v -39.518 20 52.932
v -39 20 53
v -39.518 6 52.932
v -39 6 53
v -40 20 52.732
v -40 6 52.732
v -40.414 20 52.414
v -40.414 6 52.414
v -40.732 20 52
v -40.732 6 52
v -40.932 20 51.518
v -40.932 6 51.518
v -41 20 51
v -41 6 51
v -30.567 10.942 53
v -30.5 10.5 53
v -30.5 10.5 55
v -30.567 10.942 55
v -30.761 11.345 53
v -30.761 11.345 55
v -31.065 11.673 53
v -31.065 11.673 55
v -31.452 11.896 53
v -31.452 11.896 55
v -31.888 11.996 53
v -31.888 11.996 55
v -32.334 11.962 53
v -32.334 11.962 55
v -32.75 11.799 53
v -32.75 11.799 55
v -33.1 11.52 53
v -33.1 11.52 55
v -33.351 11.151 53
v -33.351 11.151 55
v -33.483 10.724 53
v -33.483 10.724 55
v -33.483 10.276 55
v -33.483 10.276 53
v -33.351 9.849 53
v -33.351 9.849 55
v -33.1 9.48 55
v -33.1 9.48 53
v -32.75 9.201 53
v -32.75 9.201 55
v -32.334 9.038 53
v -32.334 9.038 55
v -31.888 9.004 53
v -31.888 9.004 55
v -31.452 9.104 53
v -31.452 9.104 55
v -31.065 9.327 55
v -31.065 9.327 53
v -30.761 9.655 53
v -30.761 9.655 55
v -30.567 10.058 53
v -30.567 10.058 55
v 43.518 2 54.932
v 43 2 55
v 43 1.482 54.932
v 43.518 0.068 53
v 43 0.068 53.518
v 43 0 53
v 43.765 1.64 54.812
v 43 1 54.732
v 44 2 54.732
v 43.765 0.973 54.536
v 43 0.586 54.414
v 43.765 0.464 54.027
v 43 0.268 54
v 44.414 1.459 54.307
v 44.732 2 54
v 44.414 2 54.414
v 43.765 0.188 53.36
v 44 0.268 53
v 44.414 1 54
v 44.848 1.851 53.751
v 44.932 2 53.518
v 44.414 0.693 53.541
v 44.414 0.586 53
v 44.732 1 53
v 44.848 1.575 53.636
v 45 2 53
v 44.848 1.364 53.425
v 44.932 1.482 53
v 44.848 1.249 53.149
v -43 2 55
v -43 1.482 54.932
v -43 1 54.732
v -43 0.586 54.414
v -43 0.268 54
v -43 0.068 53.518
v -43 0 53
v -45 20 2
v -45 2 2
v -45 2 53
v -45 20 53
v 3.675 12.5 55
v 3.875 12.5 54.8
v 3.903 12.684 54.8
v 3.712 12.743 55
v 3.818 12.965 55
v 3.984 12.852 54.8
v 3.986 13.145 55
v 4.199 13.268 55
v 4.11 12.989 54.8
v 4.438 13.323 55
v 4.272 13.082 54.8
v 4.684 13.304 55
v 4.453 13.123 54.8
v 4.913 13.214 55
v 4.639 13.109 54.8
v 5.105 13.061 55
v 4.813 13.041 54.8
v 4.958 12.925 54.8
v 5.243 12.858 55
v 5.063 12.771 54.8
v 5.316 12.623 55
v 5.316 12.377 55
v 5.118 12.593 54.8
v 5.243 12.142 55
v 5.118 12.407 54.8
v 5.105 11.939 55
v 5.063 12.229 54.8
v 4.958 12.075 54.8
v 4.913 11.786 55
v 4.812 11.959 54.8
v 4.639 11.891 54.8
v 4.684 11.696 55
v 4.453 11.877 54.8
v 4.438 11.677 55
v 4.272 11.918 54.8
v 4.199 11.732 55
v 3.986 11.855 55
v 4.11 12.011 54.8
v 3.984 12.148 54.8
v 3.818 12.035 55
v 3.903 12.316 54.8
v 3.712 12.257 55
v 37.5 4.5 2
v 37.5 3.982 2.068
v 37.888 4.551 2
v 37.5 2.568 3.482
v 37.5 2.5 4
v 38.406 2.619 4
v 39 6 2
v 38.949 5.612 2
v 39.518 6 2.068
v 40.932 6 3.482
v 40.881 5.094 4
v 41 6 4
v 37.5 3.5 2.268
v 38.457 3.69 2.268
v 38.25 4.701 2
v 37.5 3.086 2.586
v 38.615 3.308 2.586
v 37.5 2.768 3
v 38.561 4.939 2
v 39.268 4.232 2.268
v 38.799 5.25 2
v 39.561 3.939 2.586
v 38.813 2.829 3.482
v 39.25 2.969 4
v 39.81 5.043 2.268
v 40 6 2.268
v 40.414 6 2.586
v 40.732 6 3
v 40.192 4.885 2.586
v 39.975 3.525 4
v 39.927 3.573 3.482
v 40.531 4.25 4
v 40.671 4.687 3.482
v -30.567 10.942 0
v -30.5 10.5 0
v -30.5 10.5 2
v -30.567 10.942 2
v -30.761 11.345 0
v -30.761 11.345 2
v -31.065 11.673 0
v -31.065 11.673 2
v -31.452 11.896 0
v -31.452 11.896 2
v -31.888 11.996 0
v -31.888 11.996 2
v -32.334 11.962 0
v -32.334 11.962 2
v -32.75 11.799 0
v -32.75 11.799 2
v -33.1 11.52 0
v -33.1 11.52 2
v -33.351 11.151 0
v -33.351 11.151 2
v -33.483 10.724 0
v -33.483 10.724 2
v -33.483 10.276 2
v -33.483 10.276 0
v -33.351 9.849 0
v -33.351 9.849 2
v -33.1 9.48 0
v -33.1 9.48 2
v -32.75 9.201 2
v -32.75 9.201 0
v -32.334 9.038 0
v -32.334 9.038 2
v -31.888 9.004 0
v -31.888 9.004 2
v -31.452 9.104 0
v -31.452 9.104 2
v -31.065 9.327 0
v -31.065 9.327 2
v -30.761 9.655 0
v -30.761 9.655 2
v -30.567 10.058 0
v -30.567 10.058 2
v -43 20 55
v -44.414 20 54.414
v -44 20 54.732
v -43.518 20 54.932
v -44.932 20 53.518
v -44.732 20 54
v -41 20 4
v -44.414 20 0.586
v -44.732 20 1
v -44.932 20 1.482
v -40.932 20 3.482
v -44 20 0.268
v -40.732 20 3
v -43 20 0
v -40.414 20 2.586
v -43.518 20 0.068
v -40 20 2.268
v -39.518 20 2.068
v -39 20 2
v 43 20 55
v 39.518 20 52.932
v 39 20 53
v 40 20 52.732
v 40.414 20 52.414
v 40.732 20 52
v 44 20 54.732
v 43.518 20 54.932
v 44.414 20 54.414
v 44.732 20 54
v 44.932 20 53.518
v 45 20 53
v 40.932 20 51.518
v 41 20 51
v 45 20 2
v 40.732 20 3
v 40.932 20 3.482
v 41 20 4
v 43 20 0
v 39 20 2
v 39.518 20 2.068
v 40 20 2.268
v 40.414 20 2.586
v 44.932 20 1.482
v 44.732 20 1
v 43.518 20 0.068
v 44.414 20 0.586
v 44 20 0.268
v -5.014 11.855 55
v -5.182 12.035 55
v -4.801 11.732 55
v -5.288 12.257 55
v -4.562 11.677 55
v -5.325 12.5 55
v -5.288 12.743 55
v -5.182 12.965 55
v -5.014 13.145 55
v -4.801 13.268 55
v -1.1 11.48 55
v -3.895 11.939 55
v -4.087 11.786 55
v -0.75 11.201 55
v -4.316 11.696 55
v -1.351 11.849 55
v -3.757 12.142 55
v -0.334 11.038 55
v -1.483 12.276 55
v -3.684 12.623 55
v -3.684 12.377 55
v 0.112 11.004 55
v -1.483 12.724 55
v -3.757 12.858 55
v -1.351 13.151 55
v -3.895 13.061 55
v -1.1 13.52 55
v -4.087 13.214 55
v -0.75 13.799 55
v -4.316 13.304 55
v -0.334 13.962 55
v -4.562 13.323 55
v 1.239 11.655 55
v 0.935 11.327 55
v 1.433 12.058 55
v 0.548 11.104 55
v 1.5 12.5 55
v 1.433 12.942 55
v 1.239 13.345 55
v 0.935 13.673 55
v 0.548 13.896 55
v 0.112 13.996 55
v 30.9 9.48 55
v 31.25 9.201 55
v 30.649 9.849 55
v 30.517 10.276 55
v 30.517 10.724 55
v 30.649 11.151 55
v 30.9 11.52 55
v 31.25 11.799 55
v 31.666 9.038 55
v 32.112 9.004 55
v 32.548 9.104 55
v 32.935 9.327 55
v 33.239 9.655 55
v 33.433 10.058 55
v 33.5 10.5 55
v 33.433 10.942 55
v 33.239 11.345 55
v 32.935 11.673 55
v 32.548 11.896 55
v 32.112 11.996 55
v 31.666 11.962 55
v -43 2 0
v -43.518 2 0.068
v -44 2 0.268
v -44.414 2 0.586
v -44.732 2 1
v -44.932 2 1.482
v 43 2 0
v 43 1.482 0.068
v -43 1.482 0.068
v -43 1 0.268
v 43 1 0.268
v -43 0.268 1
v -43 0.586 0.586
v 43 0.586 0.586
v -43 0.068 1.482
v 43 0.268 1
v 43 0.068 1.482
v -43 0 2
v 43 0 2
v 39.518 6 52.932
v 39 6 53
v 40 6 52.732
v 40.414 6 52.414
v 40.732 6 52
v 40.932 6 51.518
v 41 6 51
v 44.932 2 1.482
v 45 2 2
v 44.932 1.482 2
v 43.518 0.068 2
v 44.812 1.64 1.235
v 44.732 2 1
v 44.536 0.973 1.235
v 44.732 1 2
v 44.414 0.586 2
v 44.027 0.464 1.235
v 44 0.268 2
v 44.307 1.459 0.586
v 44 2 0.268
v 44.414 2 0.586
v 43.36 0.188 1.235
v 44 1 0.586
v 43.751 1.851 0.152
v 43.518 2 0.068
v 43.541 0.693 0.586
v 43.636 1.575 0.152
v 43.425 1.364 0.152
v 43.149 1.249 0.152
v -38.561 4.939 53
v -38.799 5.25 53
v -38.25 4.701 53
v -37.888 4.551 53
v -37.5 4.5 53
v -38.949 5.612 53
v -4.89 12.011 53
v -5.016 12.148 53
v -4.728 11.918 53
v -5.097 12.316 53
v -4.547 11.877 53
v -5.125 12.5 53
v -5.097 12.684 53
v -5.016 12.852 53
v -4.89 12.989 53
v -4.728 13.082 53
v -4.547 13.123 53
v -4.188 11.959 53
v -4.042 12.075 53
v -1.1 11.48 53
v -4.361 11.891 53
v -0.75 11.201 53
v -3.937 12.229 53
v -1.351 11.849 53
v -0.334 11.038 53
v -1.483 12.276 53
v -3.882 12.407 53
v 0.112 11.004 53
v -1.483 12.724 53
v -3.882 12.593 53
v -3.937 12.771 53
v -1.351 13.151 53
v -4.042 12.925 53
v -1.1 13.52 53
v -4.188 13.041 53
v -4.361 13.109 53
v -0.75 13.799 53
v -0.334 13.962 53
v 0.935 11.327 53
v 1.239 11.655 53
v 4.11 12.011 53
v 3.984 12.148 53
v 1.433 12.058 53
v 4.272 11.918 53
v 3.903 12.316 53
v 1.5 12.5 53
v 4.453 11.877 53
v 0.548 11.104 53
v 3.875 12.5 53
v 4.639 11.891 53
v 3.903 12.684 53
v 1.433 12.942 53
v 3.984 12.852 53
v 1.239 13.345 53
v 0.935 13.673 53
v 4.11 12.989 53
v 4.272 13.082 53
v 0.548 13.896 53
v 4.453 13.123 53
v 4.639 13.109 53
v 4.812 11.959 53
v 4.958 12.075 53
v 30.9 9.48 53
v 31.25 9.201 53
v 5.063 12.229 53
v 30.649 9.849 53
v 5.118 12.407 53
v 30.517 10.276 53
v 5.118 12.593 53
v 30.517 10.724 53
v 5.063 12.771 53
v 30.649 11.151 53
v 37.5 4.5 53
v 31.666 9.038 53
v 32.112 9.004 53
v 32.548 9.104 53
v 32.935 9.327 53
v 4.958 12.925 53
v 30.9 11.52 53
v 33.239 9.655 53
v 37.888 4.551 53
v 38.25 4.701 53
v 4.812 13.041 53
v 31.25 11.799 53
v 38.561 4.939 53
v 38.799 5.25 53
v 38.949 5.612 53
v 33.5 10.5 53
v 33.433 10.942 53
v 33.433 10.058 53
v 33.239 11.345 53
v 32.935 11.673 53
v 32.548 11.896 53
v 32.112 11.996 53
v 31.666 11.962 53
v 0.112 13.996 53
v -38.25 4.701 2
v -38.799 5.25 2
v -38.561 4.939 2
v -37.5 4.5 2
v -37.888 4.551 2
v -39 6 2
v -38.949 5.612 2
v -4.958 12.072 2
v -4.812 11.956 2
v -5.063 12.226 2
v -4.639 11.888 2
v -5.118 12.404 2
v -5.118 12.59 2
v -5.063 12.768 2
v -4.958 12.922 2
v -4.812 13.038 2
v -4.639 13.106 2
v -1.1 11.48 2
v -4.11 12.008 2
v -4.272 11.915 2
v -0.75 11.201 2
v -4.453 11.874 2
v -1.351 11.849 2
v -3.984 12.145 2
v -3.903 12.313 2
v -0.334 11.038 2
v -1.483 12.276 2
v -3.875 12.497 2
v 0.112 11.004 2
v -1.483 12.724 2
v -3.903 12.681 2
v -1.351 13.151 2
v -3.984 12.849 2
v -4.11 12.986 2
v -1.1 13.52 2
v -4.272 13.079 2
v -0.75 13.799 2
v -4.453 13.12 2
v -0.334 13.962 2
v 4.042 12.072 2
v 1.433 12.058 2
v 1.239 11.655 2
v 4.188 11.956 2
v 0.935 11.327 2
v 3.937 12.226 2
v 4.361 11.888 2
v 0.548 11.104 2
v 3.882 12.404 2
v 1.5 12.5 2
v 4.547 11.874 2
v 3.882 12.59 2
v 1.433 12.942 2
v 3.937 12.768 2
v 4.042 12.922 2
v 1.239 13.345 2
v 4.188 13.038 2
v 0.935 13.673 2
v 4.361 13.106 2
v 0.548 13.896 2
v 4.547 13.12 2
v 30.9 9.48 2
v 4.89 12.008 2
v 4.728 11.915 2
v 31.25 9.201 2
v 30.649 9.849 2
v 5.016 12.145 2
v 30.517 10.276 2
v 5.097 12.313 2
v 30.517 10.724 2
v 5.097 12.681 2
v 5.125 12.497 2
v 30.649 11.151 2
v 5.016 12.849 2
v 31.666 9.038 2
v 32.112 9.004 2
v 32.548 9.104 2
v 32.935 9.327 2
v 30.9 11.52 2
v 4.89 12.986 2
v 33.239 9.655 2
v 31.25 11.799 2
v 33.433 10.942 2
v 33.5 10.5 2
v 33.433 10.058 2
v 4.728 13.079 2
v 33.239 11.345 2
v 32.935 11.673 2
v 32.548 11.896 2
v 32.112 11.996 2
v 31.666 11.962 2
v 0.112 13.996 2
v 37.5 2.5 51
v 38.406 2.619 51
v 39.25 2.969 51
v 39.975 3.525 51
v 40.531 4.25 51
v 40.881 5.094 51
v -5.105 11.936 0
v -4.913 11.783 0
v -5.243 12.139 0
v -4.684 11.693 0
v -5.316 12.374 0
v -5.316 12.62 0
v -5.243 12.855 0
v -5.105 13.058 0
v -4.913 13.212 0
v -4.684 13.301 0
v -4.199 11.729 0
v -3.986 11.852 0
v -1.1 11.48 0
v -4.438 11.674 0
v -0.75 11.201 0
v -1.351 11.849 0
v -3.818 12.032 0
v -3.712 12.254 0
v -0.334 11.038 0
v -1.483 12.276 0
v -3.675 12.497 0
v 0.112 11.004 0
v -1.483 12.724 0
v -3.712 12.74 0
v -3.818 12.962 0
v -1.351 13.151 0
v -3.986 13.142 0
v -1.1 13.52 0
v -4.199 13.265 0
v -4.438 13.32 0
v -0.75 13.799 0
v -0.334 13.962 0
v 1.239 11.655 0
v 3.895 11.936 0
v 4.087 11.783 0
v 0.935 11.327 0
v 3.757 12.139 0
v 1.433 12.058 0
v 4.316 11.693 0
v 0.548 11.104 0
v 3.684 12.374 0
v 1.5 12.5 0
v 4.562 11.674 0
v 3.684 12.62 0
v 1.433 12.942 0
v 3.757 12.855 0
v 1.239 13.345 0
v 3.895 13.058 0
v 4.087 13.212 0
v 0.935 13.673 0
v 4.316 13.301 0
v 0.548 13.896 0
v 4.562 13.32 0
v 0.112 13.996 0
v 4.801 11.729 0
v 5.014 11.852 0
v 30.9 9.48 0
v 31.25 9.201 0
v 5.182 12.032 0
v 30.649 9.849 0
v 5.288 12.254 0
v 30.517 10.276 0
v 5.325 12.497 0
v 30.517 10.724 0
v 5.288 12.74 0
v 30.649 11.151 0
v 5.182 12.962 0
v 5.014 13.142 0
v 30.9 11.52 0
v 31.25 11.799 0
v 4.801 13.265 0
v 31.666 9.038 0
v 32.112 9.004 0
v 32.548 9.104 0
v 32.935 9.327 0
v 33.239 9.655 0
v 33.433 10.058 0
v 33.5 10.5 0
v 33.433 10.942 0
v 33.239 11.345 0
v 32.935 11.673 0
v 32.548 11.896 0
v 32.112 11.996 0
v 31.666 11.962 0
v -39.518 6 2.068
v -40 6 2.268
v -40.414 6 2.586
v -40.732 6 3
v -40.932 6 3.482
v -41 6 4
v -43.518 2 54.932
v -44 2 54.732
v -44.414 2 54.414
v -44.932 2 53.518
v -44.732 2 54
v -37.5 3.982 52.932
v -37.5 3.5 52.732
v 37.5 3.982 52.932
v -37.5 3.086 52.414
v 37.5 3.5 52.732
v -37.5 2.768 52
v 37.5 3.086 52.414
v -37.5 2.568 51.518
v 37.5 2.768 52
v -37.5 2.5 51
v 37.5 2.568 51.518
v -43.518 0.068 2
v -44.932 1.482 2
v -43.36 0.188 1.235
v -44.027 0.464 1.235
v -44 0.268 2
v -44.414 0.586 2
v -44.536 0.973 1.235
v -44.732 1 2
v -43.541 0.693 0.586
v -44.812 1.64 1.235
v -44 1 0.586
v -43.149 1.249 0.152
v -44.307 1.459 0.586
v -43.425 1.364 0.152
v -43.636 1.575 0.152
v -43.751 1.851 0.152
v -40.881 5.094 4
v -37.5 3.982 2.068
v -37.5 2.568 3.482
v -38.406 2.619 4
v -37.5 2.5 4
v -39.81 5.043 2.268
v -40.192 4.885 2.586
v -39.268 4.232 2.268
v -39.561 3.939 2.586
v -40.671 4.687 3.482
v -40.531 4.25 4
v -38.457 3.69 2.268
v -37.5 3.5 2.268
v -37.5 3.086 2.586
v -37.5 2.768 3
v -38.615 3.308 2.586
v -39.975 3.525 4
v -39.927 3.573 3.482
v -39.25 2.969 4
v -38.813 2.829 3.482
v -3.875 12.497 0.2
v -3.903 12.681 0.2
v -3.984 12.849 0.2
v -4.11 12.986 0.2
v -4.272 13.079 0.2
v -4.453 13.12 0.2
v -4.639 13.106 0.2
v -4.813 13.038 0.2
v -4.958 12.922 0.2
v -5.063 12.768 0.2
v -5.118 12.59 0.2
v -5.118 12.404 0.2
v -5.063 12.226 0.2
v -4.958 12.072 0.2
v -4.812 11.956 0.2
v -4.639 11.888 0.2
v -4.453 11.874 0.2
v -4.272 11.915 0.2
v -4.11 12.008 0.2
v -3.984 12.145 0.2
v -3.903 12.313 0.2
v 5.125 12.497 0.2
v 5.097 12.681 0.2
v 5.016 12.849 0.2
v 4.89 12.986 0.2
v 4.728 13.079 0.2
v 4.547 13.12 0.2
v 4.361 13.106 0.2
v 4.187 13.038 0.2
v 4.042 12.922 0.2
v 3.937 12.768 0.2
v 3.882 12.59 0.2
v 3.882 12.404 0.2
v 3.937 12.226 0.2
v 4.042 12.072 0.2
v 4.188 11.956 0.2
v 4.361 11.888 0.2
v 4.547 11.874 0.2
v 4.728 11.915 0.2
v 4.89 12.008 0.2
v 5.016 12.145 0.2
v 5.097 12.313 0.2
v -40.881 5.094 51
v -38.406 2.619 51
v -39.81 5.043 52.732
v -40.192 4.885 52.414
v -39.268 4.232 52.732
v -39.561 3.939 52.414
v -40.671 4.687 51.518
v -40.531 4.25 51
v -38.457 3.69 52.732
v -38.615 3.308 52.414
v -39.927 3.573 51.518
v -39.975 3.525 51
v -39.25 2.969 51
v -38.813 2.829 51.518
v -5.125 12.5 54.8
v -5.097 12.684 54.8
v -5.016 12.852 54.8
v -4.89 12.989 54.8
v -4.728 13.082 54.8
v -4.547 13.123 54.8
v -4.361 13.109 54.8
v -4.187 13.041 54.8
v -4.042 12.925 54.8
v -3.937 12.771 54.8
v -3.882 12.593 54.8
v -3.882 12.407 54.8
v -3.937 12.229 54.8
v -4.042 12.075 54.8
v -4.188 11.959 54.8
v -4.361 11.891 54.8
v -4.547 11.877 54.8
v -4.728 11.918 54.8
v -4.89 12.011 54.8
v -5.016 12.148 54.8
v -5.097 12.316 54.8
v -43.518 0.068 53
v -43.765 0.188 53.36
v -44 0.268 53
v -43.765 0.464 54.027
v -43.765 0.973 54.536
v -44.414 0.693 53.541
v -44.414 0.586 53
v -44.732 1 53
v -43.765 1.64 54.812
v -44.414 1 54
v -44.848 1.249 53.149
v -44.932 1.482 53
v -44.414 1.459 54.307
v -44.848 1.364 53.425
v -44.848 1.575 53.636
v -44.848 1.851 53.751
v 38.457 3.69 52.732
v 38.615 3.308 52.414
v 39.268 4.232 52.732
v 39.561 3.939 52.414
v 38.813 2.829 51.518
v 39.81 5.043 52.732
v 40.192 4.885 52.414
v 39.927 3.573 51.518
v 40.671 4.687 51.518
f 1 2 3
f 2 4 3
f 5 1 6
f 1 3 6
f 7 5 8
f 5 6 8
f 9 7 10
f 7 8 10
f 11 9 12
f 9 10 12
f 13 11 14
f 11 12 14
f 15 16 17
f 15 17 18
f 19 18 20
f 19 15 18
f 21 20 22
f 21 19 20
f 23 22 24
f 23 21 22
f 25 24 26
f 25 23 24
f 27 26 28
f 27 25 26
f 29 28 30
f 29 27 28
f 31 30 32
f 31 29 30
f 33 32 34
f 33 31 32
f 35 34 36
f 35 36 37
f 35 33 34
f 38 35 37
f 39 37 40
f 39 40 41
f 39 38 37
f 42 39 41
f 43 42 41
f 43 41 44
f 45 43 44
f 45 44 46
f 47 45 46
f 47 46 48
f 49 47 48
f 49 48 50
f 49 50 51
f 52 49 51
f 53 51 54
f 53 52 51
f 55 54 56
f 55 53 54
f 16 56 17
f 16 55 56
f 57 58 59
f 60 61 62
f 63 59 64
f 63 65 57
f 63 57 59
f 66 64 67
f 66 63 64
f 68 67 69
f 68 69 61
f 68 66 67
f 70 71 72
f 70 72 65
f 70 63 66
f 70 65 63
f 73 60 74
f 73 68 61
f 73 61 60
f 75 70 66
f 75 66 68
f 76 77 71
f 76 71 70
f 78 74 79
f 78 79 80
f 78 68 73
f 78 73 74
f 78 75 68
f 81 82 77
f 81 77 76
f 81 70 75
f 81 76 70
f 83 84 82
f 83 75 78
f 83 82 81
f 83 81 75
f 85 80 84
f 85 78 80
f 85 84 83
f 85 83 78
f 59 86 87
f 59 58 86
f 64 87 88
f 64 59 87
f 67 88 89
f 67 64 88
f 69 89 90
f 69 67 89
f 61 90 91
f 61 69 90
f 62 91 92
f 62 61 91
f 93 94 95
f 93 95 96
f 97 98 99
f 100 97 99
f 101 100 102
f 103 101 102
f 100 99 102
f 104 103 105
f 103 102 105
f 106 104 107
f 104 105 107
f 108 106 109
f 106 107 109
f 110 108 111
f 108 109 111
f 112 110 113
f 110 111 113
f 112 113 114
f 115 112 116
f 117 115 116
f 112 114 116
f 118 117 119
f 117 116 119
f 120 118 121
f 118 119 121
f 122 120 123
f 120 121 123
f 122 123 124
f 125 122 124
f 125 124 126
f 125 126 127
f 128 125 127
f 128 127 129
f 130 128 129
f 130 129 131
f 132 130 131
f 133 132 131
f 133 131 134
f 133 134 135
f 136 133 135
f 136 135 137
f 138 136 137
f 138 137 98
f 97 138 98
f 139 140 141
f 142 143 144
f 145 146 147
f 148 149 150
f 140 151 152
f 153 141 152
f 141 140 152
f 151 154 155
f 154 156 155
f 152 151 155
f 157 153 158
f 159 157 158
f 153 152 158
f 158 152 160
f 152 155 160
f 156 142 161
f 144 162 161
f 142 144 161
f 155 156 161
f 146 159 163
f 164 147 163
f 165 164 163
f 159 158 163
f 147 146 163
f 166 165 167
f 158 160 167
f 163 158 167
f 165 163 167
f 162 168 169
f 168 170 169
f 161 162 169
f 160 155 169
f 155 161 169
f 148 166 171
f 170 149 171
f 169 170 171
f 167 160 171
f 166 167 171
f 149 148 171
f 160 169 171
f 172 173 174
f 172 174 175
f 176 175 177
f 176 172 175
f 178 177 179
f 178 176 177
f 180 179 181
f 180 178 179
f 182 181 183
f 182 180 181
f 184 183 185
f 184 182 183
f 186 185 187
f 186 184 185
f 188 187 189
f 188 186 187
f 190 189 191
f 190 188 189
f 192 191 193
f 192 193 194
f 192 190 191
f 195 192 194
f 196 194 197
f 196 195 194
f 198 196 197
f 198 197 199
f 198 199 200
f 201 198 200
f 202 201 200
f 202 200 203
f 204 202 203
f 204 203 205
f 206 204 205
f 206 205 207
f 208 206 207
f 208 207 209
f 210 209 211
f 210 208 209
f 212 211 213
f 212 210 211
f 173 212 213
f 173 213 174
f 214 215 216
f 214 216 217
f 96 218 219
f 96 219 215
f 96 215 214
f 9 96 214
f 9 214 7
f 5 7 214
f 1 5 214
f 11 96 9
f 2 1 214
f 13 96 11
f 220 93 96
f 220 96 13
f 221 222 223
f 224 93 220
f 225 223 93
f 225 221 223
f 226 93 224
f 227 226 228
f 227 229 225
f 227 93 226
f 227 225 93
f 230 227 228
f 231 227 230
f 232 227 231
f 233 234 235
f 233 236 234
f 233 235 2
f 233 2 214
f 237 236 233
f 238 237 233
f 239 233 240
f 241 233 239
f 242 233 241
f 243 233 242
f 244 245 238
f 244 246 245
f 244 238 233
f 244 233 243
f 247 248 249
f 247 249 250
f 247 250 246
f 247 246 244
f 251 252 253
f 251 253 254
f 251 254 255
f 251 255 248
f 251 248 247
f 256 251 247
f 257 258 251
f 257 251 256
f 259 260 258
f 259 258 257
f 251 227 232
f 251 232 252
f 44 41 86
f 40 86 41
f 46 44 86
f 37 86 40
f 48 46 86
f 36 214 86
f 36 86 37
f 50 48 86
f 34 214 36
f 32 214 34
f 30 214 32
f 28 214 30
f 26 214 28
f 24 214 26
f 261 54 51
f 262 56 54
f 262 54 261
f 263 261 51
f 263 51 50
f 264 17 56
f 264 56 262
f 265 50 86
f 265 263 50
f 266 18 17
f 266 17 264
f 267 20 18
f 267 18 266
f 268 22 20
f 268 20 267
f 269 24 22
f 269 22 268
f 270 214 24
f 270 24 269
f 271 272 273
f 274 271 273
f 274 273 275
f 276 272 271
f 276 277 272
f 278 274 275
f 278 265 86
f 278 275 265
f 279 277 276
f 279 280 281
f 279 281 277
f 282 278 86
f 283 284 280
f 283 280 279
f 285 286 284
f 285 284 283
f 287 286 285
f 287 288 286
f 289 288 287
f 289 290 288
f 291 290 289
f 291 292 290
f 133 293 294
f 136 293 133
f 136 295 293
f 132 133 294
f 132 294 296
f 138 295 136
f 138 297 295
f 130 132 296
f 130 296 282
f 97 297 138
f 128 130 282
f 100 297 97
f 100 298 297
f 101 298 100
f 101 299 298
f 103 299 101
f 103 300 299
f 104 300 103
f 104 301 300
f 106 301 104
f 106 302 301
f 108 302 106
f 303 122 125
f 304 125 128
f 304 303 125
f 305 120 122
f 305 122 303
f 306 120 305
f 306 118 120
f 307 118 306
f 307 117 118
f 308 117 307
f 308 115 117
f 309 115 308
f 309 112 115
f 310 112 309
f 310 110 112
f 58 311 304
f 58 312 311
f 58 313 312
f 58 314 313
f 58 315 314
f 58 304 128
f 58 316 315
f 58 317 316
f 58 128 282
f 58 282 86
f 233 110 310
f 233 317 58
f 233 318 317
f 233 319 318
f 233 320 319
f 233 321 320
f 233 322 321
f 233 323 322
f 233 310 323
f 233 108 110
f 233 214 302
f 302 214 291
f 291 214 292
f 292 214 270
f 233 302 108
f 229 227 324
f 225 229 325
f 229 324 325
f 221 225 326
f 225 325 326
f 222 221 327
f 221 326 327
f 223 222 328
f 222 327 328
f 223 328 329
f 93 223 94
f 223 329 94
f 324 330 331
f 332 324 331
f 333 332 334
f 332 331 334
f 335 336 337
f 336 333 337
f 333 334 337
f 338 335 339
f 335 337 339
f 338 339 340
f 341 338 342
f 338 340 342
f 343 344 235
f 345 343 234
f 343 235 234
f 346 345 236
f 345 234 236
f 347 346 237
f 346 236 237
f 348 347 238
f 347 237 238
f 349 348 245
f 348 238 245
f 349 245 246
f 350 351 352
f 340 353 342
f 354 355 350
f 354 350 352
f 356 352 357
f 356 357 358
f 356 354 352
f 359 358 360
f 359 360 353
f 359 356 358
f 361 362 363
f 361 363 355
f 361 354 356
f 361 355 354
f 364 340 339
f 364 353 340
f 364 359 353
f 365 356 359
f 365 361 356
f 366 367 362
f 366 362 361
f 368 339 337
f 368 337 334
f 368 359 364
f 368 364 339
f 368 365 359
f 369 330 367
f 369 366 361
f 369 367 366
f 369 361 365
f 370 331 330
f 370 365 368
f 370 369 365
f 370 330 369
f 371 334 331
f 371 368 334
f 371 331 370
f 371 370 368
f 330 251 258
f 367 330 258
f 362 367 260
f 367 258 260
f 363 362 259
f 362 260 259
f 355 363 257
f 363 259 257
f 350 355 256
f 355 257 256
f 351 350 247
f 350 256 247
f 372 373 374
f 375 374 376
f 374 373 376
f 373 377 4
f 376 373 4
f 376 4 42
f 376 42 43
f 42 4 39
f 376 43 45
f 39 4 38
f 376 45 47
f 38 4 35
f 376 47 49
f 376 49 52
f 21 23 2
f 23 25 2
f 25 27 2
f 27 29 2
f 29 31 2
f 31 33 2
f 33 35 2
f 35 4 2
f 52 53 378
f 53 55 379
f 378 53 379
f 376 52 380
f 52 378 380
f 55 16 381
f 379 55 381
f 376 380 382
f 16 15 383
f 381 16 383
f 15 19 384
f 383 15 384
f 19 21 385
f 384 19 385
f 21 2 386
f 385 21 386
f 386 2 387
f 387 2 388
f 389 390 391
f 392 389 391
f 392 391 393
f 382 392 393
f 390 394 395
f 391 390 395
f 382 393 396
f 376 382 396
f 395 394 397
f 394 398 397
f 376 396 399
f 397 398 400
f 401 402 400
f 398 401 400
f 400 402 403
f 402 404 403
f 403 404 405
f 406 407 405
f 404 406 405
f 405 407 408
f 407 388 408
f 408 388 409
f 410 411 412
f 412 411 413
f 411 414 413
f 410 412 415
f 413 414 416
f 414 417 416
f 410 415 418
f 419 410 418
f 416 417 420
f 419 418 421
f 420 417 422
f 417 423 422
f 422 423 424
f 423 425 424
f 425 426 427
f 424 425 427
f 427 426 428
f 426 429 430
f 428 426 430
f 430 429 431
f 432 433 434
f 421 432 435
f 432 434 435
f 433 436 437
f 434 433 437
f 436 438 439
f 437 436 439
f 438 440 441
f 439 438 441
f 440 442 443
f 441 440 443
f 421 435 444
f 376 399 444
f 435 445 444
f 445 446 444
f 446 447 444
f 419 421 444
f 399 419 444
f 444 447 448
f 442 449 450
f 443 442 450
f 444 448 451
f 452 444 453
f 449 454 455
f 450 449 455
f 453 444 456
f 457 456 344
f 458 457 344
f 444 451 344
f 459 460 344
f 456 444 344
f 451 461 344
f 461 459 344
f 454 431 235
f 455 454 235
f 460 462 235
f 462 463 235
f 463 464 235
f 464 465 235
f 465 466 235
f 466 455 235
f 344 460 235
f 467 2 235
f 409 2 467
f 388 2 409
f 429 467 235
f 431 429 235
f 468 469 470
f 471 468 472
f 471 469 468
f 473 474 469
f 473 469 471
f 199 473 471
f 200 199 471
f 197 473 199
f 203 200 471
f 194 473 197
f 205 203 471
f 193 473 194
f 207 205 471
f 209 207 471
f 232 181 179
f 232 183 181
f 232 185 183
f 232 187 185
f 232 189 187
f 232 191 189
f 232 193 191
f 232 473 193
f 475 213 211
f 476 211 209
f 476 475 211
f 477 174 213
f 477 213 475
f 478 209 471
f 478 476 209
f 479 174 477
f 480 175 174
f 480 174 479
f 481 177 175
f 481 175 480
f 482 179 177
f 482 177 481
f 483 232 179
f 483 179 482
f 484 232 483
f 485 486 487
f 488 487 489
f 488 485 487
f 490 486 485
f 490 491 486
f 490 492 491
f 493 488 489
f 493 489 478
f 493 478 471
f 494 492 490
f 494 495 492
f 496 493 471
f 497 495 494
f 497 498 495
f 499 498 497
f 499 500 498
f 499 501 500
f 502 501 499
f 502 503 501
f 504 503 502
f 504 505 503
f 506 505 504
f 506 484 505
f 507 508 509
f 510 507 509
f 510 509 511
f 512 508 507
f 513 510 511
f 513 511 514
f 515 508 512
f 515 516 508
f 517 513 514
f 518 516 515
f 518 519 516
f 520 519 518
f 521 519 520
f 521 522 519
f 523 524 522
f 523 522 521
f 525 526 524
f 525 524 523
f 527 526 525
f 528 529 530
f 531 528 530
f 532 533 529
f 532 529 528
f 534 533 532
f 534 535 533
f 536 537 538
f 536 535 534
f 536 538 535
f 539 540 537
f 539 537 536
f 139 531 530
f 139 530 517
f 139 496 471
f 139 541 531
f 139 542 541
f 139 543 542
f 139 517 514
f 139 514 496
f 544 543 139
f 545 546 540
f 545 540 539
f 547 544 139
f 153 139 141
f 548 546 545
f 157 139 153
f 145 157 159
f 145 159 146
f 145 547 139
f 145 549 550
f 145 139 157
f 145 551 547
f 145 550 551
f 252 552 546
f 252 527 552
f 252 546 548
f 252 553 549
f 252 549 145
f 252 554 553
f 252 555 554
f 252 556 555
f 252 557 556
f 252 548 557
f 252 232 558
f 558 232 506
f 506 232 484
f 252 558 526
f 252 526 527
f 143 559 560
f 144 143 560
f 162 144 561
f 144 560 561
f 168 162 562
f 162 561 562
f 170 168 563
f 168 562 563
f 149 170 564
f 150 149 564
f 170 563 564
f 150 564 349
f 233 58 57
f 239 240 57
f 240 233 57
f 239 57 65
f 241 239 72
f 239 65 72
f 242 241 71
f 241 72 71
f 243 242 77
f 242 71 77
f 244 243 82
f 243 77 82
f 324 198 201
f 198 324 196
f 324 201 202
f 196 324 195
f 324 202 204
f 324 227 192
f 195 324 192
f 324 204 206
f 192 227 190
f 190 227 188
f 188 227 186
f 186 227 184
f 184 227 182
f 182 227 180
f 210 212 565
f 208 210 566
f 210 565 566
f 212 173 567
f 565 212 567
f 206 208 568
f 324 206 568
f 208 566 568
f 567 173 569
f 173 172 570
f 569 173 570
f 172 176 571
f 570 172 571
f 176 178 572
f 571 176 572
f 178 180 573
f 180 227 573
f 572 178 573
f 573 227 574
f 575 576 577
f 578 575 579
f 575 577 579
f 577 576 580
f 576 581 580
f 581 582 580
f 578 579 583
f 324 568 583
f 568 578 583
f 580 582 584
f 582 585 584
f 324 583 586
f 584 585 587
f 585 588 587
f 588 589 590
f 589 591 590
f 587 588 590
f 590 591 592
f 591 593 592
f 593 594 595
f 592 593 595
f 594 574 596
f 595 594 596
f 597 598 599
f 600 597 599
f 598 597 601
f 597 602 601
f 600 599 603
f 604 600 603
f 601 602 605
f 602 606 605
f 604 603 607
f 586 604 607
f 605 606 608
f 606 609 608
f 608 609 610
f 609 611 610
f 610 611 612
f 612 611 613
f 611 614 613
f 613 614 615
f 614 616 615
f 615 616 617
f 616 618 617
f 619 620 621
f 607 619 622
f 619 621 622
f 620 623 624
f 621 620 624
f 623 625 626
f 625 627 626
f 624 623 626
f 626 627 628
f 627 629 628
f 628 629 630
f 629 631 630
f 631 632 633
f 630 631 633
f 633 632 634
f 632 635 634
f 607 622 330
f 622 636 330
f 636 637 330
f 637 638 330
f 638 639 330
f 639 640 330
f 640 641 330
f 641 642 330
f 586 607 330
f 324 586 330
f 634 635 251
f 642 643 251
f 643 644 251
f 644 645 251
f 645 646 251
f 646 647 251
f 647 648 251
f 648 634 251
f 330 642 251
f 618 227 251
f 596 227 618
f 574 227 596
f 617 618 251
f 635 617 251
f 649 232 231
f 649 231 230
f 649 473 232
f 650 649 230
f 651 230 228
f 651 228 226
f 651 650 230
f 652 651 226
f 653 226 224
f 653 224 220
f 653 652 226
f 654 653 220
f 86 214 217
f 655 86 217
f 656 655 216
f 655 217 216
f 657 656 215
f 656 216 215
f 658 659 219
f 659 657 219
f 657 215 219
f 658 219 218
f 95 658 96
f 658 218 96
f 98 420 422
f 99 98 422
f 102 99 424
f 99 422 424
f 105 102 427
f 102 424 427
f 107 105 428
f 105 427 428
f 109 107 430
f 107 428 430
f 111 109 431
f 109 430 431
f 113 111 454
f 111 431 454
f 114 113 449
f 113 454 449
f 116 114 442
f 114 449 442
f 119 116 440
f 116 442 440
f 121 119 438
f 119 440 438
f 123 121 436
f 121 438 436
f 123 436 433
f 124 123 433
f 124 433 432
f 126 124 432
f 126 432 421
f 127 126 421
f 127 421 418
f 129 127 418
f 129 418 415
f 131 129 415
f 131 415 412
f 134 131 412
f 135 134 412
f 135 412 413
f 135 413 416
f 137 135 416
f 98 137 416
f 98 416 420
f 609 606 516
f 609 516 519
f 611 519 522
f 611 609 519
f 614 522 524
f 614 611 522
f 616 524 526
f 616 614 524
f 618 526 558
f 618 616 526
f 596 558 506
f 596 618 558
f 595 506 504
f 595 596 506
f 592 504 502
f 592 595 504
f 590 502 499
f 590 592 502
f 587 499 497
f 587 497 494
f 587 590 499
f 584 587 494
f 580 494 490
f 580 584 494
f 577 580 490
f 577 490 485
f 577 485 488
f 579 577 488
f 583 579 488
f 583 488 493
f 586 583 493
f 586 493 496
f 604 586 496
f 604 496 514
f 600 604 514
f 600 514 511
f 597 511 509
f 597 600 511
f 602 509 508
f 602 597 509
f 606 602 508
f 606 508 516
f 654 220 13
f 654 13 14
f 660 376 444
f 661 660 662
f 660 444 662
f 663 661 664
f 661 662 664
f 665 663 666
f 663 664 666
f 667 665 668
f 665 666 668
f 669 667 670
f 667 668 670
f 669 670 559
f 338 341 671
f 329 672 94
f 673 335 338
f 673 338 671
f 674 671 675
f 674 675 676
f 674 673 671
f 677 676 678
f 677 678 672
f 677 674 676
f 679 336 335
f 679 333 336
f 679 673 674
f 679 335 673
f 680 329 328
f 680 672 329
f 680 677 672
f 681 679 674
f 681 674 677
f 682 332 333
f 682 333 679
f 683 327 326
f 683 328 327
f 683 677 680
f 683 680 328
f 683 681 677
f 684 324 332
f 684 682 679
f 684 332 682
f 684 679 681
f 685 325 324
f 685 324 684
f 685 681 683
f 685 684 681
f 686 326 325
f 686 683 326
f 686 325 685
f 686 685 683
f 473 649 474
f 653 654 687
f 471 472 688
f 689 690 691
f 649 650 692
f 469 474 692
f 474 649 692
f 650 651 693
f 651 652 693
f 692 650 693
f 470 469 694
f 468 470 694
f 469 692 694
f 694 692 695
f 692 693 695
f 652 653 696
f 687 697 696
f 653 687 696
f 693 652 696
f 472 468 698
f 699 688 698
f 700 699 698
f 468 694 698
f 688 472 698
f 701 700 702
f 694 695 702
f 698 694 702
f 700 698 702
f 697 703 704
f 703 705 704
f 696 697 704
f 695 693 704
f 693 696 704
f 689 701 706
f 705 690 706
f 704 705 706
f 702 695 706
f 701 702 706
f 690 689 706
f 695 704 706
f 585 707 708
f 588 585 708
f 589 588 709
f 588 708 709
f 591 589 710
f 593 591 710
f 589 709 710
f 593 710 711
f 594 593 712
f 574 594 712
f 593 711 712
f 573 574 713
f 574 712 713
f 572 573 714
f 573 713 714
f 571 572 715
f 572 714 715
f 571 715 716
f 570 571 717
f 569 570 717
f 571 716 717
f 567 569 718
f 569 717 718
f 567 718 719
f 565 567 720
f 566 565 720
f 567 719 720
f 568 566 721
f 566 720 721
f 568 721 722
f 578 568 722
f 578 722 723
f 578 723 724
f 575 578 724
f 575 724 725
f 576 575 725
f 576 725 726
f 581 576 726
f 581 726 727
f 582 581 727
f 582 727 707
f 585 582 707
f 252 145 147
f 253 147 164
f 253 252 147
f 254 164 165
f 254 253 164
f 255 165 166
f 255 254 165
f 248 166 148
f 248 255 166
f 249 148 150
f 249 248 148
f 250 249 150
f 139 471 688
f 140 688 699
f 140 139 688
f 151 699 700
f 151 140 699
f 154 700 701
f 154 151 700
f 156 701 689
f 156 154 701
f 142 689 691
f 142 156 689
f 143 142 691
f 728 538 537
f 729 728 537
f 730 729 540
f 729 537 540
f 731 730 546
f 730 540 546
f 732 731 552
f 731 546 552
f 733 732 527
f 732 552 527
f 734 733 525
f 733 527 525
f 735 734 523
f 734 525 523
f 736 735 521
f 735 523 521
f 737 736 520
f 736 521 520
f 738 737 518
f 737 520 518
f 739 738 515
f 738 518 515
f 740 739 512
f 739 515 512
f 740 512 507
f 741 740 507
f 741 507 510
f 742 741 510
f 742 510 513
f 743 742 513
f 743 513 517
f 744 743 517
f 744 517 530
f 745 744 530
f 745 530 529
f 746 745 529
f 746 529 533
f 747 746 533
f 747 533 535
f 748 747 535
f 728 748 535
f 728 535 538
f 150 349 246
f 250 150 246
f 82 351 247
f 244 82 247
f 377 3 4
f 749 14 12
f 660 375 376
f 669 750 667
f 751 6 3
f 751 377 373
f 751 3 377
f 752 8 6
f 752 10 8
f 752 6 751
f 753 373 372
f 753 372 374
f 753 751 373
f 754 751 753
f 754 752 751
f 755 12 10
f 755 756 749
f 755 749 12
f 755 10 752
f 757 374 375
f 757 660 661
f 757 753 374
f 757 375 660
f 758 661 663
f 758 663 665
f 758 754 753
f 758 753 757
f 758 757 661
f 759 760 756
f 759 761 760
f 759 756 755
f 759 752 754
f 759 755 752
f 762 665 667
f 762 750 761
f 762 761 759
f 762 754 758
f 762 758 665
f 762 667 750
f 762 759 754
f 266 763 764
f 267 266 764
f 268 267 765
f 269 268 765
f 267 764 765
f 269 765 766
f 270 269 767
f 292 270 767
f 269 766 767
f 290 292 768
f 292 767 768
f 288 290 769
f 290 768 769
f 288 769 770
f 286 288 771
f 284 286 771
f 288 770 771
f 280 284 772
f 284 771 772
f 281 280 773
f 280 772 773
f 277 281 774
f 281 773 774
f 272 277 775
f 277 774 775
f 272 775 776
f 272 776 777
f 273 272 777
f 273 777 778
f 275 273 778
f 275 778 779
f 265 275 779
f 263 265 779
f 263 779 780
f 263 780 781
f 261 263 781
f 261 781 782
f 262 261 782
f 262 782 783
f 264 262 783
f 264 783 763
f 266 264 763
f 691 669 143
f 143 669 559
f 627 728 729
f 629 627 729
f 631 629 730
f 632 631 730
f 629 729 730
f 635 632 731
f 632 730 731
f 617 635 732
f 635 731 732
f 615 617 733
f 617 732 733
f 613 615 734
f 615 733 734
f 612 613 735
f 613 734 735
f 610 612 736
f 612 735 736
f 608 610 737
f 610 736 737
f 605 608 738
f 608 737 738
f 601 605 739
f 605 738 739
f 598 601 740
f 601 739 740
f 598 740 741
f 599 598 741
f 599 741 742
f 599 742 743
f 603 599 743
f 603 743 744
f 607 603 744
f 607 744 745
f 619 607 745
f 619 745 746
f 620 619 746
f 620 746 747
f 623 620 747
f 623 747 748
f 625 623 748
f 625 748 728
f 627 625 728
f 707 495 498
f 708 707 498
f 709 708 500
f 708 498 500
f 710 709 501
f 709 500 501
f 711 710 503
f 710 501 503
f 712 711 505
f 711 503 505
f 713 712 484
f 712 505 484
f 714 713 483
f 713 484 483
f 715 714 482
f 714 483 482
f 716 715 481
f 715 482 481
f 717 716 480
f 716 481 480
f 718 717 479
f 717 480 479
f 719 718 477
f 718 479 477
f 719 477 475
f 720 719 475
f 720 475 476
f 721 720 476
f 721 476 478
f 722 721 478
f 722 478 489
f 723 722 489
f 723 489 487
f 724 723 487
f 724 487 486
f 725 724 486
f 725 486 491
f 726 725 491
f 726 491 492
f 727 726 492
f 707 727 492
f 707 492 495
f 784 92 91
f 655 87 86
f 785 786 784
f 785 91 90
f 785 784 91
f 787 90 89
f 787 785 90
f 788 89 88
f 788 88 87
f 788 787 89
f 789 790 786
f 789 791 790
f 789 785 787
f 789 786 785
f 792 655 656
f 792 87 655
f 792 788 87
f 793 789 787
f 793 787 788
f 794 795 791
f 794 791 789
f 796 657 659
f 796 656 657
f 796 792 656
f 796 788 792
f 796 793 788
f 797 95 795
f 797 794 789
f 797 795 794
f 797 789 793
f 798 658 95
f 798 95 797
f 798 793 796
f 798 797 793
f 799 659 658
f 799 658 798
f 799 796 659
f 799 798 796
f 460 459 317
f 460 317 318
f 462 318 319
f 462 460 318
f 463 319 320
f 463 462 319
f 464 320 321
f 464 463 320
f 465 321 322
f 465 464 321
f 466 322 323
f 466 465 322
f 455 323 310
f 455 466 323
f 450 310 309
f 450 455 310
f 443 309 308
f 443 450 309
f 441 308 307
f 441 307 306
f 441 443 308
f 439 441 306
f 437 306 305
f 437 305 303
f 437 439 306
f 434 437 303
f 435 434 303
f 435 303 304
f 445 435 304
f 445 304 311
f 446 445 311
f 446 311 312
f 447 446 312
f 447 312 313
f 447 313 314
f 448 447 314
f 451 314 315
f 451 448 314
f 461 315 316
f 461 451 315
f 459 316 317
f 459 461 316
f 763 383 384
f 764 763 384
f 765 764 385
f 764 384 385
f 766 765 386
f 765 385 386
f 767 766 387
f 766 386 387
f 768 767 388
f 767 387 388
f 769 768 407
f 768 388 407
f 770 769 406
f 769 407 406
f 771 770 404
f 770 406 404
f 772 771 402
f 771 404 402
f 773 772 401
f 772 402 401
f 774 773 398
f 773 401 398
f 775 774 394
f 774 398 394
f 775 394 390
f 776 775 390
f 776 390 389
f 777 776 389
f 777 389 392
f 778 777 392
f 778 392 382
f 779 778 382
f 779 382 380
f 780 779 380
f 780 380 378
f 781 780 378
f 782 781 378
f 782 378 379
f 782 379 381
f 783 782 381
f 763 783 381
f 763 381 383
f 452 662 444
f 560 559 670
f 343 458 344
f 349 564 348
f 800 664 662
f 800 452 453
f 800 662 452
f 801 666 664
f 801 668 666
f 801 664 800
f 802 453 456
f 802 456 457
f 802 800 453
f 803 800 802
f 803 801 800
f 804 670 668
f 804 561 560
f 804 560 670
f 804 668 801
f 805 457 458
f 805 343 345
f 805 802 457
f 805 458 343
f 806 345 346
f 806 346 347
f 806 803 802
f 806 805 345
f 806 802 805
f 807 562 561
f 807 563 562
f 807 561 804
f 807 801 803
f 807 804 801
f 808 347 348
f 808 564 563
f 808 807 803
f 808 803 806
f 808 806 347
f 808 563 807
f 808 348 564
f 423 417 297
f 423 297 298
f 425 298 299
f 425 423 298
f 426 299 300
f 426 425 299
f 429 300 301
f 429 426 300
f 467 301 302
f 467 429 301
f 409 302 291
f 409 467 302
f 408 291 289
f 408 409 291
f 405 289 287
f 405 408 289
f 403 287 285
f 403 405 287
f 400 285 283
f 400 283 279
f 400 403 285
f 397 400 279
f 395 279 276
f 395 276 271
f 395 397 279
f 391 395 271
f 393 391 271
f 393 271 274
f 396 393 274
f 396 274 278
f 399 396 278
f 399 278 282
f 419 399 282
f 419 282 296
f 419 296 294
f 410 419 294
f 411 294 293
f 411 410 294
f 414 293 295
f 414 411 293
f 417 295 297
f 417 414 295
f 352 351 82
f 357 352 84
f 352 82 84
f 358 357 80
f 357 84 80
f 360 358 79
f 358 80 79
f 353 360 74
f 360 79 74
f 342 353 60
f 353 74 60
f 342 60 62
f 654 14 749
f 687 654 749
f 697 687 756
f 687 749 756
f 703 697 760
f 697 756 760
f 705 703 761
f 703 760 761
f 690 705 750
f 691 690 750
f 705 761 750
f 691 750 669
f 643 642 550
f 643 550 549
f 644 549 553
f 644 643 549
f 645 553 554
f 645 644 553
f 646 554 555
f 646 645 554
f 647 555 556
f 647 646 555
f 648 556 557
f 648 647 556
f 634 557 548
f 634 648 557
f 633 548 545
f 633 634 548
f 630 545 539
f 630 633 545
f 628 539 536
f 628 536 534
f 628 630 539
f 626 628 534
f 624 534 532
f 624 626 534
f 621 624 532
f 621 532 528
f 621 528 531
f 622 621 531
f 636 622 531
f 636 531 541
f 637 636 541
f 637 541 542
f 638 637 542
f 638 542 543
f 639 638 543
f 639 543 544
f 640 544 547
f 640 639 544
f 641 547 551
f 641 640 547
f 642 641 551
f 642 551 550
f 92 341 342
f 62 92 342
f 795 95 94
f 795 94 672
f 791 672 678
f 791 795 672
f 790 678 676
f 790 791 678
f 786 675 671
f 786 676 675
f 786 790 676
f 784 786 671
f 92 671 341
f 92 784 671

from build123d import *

# Parameters (mm, degrees)
ESQUISSE1_W                   = 90
ESQUISSE1_H                   = 20
ESQUISSE1_R                   = 1.5
BOSS_EXTRU_1_DEPTH            = 2
ESQUISSE2_W                   = 90
ESQUISSE2_H                   = 20
BOSS_EXTRU_2_DEPTH            = 51
ENL_V_MAT_EXTRU_2_DEPTH       = 51
ESQUISSE6_W                   = 90
ESQUISSE6_H                   = 20
ESQUISSE6_R                   = 1.5
BOSS_EXTRU_4_DEPTH            = 2
TROU_TARAUD_M1_61_D           = 1.25
TROU_TARAUD_M1_61_DEPTH       = 2
TROU_TARAUD_M1_61_CSINK_D     = 1.65
TROU_TARAUD_M1_61_CSINK_ANGLE = 90
TROU_TARAUD_M1_62_D           = 1.25
TROU_TARAUD_M1_62_DEPTH       = 2
TROU_TARAUD_M1_62_CSINK_D     = 1.65
TROU_TARAUD_M1_62_CSINK_ANGLE = 90
CONG_1_R                      = 2
CONG_2_R                      = 2
CONG_3_R                      = 2
CONG_4_R                      = 2


with BuildPart() as part:
    # Esquisse1 → Boss.-Extru.1 (new body)
    with BuildSketch(Plane.XY):
        with Locations((0, 10)):
            Rectangle(ESQUISSE1_W, ESQUISSE1_H)
        with Locations((-32, 10.5)):
            Circle(ESQUISSE1_R, mode=Mode.SUBTRACT)
        with Locations((32, 10.5)):
            Circle(ESQUISSE1_R, mode=Mode.SUBTRACT)
        with Locations((0, 12.5)):
            Circle(ESQUISSE1_R, mode=Mode.SUBTRACT)
    extrude(amount=BOSS_EXTRU_1_DEPTH)

    # Esquisse2 → Boss.-Extru.2 (add)
    with BuildSketch(Plane.XY.offset(2)):
        with Locations((0, 10)):
            Rectangle(ESQUISSE2_W, ESQUISSE2_H)
    extrude(amount=BOSS_EXTRU_2_DEPTH)

    # Esquisse4 → Enlèv. mat.-Extru.2 (cut)
    with BuildSketch(Plane.XY.offset(53)):
        with BuildLine():
            Line((-37.5, 2.5), (37.5, 2.5))
            ThreePointArc((37.5, 2.5), (39.974873734, 3.525126266), (41, 6))
            Line((41, 6), (41, 20))
            Line((41, 20), (-41, 20))
            Line((-41, 20), (-41, 6))
            ThreePointArc((-41, 6), (-39.974873734, 3.525126266), (-37.5, 2.5))
        make_face()
    extrude(amount=-ENL_V_MAT_EXTRU_2_DEPTH, mode=Mode.SUBTRACT)

    # Esquisse6 → Boss.-Extru.4 (add)
    with BuildSketch(Plane.XY.offset(53)):
        with Locations((0, 10)):
            Rectangle(ESQUISSE6_W, ESQUISSE6_H)
        with Locations((32, 10.5)):
            Circle(ESQUISSE6_R, mode=Mode.SUBTRACT)
        with Locations((0, 12.5)):
            Circle(ESQUISSE6_R, mode=Mode.SUBTRACT)
        with Locations((-32, 10.5)):
            Circle(ESQUISSE6_R, mode=Mode.SUBTRACT)
    extrude(amount=BOSS_EXTRU_4_DEPTH)

    # Trou taraudé M1.61
    with Locations(Plane.XY.offset(55)):
        with Locations((-4.5, 12.5), (4.5, 12.5)):
            CounterSinkHole(TROU_TARAUD_M1_61_D / 2, TROU_TARAUD_M1_61_CSINK_D / 2, depth=TROU_TARAUD_M1_61_DEPTH, counter_sink_angle=TROU_TARAUD_M1_61_CSINK_ANGLE)

    # Trou taraudé M1.62
    with Locations(Plane(origin=(0, 0, 0), x_dir=(-1, 0, 0), z_dir=(0, 0, -1))):
        with Locations((-4.5, 12.497038502), (4.5, 12.497038502)):
            CounterSinkHole(TROU_TARAUD_M1_62_D / 2, TROU_TARAUD_M1_62_CSINK_D / 2, depth=TROU_TARAUD_M1_62_DEPTH, counter_sink_angle=TROU_TARAUD_M1_62_CSINK_ANGLE)

    # Congé1
    cong_1_edges = [part.edges().sort_by_distance(p)[0] for p in [
        (-39.974873734, 3.525126266, 2),
        (-41, 13, 2),
        (41, 13, 2),
        (39.974873734, 3.525126266, 2),
        (0, 2.5, 2),
    ]]
    fillet(cong_1_edges, radius=CONG_1_R)

    # Congé2
    cong_2_edges = [part.edges().sort_by_distance(p)[0] for p in [
        (-39.974873734, 3.525126266, 53),
        (0, 2.5, 53),
        (39.974873734, 3.525126266, 53),
        (41, 13, 53),
        (-41, 13, 53),
    ]]
    fillet(cong_2_edges, radius=CONG_2_R)

    # Congé3
    cong_3_edges = [part.edges().sort_by_distance(p)[0] for p in [
        (0, 0, 0),
        (0, 0, 55),
        (45, 0, 27.5),
        (-45, 0, 27.5),
    ]]
    fillet(cong_3_edges, radius=CONG_3_R)

    # Congé4
    # the kernel refuses this fillet: 2 mm, written as the material it takes off along each edge
    with BuildSketch(Plane(origin=(43, 2, 53), x_dir=(0, 0, 1), z_dir=(1, 0, 0))) as cong_4_piece_1_section:
        Polygon((0, 0), (CONG_4_R, 0), (CONG_4_R, CONG_4_R), (0, CONG_4_R), align=None)
    cong_4_piece_1 = extrude(amount=CONG_4_R, mode=Mode.PRIVATE)
    cong_4_piece_1 = cong_4_piece_1 - Plane(origin=(43, 2, 53), x_dir=(0, 0.7071067811865475, -0.7071067811865475), z_dir=(1, 0, 0)) * Sphere(CONG_4_R, mode=Mode.PRIVATE)
    add(cong_4_piece_1, mode=Mode.SUBTRACT)
    with BuildSketch(Plane(origin=(43, 2, 2), x_dir=(1, 0, 0), z_dir=(0, 0, -1))) as cong_4_piece_2_section:
        Polygon((0, 0), (CONG_4_R, 0), (CONG_4_R, CONG_4_R), (0, CONG_4_R), align=None)
    cong_4_piece_2 = extrude(amount=CONG_4_R, mode=Mode.PRIVATE)
    cong_4_piece_2 = cong_4_piece_2 - Plane(origin=(43, 2, 2), x_dir=(-0.7071067811865474, 0.7071067811865477, 0), z_dir=(0, 0, -1)) * Sphere(CONG_4_R, mode=Mode.PRIVATE)
    add(cong_4_piece_2, mode=Mode.SUBTRACT)
    with BuildSketch(Plane(origin=(-43, 2, 53), x_dir=(0, 0, 1), z_dir=(-1, 0, 0))) as cong_4_piece_3_section:
        Polygon((0, 0), (CONG_4_R, 0), (CONG_4_R, -CONG_4_R), (0, -CONG_4_R), align=None)
    cong_4_piece_3 = extrude(amount=CONG_4_R, mode=Mode.PRIVATE)
    cong_4_piece_3 = cong_4_piece_3 - Plane(origin=(-43, 2, 53), x_dir=(0, 0.7071067811865475, -0.7071067811865475), z_dir=(-1, 0, 0)) * Sphere(CONG_4_R, mode=Mode.PRIVATE)
    add(cong_4_piece_3, mode=Mode.SUBTRACT)
    with BuildSketch(Plane(origin=(-43, 2, 2), x_dir=(-1, 0, 0), z_dir=(0, 0, -1))) as cong_4_piece_4_section:
        Polygon((0, 0), (CONG_4_R, 0), (CONG_4_R, -CONG_4_R), (0, -CONG_4_R), align=None)
    cong_4_piece_4 = extrude(amount=CONG_4_R, mode=Mode.PRIVATE)
    cong_4_piece_4 = cong_4_piece_4 - Plane(origin=(-43, 2, 2), x_dir=(0.7071067811865474, 0.7071067811865477, 0), z_dir=(0, 0, -1)) * Sphere(CONG_4_R, mode=Mode.PRIVATE)
    add(cong_4_piece_4, mode=Mode.SUBTRACT)
    with BuildSketch(Plane(origin=(45, 2, 55), x_dir=(0, 0, -1), z_dir=(0, 1, 0)), Plane(origin=(-45, 25, 55), x_dir=(0, 0, -1), z_dir=(0, -1, 0))) as cong_4_piece_5:
        with BuildLine():
            CenterArc((CONG_4_R, CONG_4_R), CONG_4_R, 180, 90)
            Line((0, CONG_4_R), (0, 0))
            Line((0, 0), (CONG_4_R, 0))
        make_face()
    extrude(amount=23, mode=Mode.SUBTRACT)
    with BuildSketch(Plane(origin=(45, 25, 0), x_dir=(-1, 0, 0), z_dir=(0, -1, 0)), Plane(origin=(-45, 2, 0), x_dir=(1, 0, 0), z_dir=(0, 1, 0))) as cong_4_piece_6:
        with BuildLine():
            CenterArc((CONG_4_R, -CONG_4_R), CONG_4_R, 90, 90)
            Line((0, -CONG_4_R), (0, 0))
            Line((0, 0), (CONG_4_R, 0))
        make_face()
    extrude(amount=23, mode=Mode.SUBTRACT)


solid = part.part
